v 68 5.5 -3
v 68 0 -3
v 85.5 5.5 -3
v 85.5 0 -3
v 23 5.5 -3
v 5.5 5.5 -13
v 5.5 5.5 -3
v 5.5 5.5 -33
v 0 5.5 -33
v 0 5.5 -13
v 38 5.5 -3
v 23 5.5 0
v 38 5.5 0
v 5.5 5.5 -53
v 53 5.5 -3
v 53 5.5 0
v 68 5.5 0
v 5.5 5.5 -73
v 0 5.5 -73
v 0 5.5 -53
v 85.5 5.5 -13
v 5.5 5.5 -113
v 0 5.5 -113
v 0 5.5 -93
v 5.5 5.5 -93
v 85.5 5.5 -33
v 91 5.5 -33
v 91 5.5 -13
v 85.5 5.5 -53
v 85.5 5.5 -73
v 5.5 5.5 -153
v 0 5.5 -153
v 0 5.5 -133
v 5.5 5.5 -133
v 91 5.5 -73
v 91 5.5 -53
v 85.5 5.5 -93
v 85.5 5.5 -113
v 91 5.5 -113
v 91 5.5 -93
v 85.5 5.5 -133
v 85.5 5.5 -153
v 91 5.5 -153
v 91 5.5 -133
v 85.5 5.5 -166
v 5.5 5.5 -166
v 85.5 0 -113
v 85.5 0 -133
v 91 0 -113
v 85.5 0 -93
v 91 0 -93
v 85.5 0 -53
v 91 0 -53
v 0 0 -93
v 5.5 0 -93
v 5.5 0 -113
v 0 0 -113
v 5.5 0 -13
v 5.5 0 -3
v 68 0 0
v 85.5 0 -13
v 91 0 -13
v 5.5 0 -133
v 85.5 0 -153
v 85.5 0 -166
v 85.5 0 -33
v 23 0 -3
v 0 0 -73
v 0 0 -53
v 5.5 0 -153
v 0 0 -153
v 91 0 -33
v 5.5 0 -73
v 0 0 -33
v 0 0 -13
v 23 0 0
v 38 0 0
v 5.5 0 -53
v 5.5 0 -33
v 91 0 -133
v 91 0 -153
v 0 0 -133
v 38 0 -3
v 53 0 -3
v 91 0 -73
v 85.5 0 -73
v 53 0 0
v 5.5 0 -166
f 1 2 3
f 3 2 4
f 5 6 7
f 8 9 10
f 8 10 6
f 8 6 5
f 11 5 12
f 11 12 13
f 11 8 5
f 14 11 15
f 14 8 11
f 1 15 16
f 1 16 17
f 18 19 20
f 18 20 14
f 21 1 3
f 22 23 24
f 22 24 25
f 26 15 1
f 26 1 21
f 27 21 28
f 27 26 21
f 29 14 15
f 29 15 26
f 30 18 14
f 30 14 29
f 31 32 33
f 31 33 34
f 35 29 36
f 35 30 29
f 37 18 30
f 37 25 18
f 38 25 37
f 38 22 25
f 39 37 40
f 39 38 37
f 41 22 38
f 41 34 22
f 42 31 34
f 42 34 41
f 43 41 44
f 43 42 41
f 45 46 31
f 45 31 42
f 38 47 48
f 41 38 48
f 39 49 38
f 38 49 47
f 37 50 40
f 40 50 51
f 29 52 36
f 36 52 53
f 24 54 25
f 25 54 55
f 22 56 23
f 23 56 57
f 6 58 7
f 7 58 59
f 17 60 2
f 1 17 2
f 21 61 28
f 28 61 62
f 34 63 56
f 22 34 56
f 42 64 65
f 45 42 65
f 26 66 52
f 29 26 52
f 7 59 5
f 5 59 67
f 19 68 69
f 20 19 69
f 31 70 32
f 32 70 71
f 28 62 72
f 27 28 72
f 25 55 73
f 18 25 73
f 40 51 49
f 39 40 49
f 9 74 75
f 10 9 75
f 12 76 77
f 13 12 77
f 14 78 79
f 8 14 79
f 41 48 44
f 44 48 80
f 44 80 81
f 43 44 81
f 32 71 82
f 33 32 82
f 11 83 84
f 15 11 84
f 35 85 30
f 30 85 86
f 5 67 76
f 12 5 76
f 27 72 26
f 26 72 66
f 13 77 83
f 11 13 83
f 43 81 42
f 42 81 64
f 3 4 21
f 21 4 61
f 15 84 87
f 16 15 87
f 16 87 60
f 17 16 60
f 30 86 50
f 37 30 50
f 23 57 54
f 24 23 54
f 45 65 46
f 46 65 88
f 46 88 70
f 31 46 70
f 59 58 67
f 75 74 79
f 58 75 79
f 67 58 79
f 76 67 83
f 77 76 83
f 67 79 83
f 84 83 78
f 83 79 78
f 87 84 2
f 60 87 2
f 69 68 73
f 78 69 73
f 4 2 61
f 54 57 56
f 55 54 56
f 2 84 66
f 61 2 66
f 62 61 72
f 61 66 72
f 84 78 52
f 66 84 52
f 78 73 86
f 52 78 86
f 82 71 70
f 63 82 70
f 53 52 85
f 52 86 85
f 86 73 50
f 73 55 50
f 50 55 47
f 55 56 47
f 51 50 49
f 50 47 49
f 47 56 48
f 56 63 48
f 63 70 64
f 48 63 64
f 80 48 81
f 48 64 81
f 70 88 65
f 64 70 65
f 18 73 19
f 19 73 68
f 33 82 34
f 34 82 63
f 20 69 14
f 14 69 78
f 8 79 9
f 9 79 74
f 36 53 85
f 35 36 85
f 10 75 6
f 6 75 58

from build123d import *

# Parameters (mm, degrees)
SALIENTE_EXTRUIR1_DEPTH = 5.5


with BuildPart() as part:
    # Croquis1 → Saliente-Extruir1 (new body)
    with BuildSketch(Plane(origin=(0, 0, 0), x_dir=(1, 0, 0), z_dir=(0, 1, 0))):
        Polygon((23, 3), (23, 0), (38, 0), (38, 3), (53, 3), (53, 0), (68, 0), (68, 3), (85.5, 3), (85.5, 13), (91, 13), (91, 33), (85.5, 33), (85.5, 53), (91, 53), (91, 73), (85.5, 73), (85.5, 93), (91, 93), (91, 113), (85.5, 113), (85.5, 133), (91, 133), (91, 153), (85.5, 153), (85.5, 166), (5.5, 166), (5.5, 153), (0, 153), (0, 133), (5.5, 133), (5.5, 113), (0, 113), (0, 93), (5.5, 93), (5.5, 73), (0, 73), (0, 53), (5.5, 53), (5.5, 33), (0, 33), (0, 13), (5.5, 13), (5.5, 3), align=None)
    extrude(amount=SALIENTE_EXTRUIR1_DEPTH)


solid = part.part
